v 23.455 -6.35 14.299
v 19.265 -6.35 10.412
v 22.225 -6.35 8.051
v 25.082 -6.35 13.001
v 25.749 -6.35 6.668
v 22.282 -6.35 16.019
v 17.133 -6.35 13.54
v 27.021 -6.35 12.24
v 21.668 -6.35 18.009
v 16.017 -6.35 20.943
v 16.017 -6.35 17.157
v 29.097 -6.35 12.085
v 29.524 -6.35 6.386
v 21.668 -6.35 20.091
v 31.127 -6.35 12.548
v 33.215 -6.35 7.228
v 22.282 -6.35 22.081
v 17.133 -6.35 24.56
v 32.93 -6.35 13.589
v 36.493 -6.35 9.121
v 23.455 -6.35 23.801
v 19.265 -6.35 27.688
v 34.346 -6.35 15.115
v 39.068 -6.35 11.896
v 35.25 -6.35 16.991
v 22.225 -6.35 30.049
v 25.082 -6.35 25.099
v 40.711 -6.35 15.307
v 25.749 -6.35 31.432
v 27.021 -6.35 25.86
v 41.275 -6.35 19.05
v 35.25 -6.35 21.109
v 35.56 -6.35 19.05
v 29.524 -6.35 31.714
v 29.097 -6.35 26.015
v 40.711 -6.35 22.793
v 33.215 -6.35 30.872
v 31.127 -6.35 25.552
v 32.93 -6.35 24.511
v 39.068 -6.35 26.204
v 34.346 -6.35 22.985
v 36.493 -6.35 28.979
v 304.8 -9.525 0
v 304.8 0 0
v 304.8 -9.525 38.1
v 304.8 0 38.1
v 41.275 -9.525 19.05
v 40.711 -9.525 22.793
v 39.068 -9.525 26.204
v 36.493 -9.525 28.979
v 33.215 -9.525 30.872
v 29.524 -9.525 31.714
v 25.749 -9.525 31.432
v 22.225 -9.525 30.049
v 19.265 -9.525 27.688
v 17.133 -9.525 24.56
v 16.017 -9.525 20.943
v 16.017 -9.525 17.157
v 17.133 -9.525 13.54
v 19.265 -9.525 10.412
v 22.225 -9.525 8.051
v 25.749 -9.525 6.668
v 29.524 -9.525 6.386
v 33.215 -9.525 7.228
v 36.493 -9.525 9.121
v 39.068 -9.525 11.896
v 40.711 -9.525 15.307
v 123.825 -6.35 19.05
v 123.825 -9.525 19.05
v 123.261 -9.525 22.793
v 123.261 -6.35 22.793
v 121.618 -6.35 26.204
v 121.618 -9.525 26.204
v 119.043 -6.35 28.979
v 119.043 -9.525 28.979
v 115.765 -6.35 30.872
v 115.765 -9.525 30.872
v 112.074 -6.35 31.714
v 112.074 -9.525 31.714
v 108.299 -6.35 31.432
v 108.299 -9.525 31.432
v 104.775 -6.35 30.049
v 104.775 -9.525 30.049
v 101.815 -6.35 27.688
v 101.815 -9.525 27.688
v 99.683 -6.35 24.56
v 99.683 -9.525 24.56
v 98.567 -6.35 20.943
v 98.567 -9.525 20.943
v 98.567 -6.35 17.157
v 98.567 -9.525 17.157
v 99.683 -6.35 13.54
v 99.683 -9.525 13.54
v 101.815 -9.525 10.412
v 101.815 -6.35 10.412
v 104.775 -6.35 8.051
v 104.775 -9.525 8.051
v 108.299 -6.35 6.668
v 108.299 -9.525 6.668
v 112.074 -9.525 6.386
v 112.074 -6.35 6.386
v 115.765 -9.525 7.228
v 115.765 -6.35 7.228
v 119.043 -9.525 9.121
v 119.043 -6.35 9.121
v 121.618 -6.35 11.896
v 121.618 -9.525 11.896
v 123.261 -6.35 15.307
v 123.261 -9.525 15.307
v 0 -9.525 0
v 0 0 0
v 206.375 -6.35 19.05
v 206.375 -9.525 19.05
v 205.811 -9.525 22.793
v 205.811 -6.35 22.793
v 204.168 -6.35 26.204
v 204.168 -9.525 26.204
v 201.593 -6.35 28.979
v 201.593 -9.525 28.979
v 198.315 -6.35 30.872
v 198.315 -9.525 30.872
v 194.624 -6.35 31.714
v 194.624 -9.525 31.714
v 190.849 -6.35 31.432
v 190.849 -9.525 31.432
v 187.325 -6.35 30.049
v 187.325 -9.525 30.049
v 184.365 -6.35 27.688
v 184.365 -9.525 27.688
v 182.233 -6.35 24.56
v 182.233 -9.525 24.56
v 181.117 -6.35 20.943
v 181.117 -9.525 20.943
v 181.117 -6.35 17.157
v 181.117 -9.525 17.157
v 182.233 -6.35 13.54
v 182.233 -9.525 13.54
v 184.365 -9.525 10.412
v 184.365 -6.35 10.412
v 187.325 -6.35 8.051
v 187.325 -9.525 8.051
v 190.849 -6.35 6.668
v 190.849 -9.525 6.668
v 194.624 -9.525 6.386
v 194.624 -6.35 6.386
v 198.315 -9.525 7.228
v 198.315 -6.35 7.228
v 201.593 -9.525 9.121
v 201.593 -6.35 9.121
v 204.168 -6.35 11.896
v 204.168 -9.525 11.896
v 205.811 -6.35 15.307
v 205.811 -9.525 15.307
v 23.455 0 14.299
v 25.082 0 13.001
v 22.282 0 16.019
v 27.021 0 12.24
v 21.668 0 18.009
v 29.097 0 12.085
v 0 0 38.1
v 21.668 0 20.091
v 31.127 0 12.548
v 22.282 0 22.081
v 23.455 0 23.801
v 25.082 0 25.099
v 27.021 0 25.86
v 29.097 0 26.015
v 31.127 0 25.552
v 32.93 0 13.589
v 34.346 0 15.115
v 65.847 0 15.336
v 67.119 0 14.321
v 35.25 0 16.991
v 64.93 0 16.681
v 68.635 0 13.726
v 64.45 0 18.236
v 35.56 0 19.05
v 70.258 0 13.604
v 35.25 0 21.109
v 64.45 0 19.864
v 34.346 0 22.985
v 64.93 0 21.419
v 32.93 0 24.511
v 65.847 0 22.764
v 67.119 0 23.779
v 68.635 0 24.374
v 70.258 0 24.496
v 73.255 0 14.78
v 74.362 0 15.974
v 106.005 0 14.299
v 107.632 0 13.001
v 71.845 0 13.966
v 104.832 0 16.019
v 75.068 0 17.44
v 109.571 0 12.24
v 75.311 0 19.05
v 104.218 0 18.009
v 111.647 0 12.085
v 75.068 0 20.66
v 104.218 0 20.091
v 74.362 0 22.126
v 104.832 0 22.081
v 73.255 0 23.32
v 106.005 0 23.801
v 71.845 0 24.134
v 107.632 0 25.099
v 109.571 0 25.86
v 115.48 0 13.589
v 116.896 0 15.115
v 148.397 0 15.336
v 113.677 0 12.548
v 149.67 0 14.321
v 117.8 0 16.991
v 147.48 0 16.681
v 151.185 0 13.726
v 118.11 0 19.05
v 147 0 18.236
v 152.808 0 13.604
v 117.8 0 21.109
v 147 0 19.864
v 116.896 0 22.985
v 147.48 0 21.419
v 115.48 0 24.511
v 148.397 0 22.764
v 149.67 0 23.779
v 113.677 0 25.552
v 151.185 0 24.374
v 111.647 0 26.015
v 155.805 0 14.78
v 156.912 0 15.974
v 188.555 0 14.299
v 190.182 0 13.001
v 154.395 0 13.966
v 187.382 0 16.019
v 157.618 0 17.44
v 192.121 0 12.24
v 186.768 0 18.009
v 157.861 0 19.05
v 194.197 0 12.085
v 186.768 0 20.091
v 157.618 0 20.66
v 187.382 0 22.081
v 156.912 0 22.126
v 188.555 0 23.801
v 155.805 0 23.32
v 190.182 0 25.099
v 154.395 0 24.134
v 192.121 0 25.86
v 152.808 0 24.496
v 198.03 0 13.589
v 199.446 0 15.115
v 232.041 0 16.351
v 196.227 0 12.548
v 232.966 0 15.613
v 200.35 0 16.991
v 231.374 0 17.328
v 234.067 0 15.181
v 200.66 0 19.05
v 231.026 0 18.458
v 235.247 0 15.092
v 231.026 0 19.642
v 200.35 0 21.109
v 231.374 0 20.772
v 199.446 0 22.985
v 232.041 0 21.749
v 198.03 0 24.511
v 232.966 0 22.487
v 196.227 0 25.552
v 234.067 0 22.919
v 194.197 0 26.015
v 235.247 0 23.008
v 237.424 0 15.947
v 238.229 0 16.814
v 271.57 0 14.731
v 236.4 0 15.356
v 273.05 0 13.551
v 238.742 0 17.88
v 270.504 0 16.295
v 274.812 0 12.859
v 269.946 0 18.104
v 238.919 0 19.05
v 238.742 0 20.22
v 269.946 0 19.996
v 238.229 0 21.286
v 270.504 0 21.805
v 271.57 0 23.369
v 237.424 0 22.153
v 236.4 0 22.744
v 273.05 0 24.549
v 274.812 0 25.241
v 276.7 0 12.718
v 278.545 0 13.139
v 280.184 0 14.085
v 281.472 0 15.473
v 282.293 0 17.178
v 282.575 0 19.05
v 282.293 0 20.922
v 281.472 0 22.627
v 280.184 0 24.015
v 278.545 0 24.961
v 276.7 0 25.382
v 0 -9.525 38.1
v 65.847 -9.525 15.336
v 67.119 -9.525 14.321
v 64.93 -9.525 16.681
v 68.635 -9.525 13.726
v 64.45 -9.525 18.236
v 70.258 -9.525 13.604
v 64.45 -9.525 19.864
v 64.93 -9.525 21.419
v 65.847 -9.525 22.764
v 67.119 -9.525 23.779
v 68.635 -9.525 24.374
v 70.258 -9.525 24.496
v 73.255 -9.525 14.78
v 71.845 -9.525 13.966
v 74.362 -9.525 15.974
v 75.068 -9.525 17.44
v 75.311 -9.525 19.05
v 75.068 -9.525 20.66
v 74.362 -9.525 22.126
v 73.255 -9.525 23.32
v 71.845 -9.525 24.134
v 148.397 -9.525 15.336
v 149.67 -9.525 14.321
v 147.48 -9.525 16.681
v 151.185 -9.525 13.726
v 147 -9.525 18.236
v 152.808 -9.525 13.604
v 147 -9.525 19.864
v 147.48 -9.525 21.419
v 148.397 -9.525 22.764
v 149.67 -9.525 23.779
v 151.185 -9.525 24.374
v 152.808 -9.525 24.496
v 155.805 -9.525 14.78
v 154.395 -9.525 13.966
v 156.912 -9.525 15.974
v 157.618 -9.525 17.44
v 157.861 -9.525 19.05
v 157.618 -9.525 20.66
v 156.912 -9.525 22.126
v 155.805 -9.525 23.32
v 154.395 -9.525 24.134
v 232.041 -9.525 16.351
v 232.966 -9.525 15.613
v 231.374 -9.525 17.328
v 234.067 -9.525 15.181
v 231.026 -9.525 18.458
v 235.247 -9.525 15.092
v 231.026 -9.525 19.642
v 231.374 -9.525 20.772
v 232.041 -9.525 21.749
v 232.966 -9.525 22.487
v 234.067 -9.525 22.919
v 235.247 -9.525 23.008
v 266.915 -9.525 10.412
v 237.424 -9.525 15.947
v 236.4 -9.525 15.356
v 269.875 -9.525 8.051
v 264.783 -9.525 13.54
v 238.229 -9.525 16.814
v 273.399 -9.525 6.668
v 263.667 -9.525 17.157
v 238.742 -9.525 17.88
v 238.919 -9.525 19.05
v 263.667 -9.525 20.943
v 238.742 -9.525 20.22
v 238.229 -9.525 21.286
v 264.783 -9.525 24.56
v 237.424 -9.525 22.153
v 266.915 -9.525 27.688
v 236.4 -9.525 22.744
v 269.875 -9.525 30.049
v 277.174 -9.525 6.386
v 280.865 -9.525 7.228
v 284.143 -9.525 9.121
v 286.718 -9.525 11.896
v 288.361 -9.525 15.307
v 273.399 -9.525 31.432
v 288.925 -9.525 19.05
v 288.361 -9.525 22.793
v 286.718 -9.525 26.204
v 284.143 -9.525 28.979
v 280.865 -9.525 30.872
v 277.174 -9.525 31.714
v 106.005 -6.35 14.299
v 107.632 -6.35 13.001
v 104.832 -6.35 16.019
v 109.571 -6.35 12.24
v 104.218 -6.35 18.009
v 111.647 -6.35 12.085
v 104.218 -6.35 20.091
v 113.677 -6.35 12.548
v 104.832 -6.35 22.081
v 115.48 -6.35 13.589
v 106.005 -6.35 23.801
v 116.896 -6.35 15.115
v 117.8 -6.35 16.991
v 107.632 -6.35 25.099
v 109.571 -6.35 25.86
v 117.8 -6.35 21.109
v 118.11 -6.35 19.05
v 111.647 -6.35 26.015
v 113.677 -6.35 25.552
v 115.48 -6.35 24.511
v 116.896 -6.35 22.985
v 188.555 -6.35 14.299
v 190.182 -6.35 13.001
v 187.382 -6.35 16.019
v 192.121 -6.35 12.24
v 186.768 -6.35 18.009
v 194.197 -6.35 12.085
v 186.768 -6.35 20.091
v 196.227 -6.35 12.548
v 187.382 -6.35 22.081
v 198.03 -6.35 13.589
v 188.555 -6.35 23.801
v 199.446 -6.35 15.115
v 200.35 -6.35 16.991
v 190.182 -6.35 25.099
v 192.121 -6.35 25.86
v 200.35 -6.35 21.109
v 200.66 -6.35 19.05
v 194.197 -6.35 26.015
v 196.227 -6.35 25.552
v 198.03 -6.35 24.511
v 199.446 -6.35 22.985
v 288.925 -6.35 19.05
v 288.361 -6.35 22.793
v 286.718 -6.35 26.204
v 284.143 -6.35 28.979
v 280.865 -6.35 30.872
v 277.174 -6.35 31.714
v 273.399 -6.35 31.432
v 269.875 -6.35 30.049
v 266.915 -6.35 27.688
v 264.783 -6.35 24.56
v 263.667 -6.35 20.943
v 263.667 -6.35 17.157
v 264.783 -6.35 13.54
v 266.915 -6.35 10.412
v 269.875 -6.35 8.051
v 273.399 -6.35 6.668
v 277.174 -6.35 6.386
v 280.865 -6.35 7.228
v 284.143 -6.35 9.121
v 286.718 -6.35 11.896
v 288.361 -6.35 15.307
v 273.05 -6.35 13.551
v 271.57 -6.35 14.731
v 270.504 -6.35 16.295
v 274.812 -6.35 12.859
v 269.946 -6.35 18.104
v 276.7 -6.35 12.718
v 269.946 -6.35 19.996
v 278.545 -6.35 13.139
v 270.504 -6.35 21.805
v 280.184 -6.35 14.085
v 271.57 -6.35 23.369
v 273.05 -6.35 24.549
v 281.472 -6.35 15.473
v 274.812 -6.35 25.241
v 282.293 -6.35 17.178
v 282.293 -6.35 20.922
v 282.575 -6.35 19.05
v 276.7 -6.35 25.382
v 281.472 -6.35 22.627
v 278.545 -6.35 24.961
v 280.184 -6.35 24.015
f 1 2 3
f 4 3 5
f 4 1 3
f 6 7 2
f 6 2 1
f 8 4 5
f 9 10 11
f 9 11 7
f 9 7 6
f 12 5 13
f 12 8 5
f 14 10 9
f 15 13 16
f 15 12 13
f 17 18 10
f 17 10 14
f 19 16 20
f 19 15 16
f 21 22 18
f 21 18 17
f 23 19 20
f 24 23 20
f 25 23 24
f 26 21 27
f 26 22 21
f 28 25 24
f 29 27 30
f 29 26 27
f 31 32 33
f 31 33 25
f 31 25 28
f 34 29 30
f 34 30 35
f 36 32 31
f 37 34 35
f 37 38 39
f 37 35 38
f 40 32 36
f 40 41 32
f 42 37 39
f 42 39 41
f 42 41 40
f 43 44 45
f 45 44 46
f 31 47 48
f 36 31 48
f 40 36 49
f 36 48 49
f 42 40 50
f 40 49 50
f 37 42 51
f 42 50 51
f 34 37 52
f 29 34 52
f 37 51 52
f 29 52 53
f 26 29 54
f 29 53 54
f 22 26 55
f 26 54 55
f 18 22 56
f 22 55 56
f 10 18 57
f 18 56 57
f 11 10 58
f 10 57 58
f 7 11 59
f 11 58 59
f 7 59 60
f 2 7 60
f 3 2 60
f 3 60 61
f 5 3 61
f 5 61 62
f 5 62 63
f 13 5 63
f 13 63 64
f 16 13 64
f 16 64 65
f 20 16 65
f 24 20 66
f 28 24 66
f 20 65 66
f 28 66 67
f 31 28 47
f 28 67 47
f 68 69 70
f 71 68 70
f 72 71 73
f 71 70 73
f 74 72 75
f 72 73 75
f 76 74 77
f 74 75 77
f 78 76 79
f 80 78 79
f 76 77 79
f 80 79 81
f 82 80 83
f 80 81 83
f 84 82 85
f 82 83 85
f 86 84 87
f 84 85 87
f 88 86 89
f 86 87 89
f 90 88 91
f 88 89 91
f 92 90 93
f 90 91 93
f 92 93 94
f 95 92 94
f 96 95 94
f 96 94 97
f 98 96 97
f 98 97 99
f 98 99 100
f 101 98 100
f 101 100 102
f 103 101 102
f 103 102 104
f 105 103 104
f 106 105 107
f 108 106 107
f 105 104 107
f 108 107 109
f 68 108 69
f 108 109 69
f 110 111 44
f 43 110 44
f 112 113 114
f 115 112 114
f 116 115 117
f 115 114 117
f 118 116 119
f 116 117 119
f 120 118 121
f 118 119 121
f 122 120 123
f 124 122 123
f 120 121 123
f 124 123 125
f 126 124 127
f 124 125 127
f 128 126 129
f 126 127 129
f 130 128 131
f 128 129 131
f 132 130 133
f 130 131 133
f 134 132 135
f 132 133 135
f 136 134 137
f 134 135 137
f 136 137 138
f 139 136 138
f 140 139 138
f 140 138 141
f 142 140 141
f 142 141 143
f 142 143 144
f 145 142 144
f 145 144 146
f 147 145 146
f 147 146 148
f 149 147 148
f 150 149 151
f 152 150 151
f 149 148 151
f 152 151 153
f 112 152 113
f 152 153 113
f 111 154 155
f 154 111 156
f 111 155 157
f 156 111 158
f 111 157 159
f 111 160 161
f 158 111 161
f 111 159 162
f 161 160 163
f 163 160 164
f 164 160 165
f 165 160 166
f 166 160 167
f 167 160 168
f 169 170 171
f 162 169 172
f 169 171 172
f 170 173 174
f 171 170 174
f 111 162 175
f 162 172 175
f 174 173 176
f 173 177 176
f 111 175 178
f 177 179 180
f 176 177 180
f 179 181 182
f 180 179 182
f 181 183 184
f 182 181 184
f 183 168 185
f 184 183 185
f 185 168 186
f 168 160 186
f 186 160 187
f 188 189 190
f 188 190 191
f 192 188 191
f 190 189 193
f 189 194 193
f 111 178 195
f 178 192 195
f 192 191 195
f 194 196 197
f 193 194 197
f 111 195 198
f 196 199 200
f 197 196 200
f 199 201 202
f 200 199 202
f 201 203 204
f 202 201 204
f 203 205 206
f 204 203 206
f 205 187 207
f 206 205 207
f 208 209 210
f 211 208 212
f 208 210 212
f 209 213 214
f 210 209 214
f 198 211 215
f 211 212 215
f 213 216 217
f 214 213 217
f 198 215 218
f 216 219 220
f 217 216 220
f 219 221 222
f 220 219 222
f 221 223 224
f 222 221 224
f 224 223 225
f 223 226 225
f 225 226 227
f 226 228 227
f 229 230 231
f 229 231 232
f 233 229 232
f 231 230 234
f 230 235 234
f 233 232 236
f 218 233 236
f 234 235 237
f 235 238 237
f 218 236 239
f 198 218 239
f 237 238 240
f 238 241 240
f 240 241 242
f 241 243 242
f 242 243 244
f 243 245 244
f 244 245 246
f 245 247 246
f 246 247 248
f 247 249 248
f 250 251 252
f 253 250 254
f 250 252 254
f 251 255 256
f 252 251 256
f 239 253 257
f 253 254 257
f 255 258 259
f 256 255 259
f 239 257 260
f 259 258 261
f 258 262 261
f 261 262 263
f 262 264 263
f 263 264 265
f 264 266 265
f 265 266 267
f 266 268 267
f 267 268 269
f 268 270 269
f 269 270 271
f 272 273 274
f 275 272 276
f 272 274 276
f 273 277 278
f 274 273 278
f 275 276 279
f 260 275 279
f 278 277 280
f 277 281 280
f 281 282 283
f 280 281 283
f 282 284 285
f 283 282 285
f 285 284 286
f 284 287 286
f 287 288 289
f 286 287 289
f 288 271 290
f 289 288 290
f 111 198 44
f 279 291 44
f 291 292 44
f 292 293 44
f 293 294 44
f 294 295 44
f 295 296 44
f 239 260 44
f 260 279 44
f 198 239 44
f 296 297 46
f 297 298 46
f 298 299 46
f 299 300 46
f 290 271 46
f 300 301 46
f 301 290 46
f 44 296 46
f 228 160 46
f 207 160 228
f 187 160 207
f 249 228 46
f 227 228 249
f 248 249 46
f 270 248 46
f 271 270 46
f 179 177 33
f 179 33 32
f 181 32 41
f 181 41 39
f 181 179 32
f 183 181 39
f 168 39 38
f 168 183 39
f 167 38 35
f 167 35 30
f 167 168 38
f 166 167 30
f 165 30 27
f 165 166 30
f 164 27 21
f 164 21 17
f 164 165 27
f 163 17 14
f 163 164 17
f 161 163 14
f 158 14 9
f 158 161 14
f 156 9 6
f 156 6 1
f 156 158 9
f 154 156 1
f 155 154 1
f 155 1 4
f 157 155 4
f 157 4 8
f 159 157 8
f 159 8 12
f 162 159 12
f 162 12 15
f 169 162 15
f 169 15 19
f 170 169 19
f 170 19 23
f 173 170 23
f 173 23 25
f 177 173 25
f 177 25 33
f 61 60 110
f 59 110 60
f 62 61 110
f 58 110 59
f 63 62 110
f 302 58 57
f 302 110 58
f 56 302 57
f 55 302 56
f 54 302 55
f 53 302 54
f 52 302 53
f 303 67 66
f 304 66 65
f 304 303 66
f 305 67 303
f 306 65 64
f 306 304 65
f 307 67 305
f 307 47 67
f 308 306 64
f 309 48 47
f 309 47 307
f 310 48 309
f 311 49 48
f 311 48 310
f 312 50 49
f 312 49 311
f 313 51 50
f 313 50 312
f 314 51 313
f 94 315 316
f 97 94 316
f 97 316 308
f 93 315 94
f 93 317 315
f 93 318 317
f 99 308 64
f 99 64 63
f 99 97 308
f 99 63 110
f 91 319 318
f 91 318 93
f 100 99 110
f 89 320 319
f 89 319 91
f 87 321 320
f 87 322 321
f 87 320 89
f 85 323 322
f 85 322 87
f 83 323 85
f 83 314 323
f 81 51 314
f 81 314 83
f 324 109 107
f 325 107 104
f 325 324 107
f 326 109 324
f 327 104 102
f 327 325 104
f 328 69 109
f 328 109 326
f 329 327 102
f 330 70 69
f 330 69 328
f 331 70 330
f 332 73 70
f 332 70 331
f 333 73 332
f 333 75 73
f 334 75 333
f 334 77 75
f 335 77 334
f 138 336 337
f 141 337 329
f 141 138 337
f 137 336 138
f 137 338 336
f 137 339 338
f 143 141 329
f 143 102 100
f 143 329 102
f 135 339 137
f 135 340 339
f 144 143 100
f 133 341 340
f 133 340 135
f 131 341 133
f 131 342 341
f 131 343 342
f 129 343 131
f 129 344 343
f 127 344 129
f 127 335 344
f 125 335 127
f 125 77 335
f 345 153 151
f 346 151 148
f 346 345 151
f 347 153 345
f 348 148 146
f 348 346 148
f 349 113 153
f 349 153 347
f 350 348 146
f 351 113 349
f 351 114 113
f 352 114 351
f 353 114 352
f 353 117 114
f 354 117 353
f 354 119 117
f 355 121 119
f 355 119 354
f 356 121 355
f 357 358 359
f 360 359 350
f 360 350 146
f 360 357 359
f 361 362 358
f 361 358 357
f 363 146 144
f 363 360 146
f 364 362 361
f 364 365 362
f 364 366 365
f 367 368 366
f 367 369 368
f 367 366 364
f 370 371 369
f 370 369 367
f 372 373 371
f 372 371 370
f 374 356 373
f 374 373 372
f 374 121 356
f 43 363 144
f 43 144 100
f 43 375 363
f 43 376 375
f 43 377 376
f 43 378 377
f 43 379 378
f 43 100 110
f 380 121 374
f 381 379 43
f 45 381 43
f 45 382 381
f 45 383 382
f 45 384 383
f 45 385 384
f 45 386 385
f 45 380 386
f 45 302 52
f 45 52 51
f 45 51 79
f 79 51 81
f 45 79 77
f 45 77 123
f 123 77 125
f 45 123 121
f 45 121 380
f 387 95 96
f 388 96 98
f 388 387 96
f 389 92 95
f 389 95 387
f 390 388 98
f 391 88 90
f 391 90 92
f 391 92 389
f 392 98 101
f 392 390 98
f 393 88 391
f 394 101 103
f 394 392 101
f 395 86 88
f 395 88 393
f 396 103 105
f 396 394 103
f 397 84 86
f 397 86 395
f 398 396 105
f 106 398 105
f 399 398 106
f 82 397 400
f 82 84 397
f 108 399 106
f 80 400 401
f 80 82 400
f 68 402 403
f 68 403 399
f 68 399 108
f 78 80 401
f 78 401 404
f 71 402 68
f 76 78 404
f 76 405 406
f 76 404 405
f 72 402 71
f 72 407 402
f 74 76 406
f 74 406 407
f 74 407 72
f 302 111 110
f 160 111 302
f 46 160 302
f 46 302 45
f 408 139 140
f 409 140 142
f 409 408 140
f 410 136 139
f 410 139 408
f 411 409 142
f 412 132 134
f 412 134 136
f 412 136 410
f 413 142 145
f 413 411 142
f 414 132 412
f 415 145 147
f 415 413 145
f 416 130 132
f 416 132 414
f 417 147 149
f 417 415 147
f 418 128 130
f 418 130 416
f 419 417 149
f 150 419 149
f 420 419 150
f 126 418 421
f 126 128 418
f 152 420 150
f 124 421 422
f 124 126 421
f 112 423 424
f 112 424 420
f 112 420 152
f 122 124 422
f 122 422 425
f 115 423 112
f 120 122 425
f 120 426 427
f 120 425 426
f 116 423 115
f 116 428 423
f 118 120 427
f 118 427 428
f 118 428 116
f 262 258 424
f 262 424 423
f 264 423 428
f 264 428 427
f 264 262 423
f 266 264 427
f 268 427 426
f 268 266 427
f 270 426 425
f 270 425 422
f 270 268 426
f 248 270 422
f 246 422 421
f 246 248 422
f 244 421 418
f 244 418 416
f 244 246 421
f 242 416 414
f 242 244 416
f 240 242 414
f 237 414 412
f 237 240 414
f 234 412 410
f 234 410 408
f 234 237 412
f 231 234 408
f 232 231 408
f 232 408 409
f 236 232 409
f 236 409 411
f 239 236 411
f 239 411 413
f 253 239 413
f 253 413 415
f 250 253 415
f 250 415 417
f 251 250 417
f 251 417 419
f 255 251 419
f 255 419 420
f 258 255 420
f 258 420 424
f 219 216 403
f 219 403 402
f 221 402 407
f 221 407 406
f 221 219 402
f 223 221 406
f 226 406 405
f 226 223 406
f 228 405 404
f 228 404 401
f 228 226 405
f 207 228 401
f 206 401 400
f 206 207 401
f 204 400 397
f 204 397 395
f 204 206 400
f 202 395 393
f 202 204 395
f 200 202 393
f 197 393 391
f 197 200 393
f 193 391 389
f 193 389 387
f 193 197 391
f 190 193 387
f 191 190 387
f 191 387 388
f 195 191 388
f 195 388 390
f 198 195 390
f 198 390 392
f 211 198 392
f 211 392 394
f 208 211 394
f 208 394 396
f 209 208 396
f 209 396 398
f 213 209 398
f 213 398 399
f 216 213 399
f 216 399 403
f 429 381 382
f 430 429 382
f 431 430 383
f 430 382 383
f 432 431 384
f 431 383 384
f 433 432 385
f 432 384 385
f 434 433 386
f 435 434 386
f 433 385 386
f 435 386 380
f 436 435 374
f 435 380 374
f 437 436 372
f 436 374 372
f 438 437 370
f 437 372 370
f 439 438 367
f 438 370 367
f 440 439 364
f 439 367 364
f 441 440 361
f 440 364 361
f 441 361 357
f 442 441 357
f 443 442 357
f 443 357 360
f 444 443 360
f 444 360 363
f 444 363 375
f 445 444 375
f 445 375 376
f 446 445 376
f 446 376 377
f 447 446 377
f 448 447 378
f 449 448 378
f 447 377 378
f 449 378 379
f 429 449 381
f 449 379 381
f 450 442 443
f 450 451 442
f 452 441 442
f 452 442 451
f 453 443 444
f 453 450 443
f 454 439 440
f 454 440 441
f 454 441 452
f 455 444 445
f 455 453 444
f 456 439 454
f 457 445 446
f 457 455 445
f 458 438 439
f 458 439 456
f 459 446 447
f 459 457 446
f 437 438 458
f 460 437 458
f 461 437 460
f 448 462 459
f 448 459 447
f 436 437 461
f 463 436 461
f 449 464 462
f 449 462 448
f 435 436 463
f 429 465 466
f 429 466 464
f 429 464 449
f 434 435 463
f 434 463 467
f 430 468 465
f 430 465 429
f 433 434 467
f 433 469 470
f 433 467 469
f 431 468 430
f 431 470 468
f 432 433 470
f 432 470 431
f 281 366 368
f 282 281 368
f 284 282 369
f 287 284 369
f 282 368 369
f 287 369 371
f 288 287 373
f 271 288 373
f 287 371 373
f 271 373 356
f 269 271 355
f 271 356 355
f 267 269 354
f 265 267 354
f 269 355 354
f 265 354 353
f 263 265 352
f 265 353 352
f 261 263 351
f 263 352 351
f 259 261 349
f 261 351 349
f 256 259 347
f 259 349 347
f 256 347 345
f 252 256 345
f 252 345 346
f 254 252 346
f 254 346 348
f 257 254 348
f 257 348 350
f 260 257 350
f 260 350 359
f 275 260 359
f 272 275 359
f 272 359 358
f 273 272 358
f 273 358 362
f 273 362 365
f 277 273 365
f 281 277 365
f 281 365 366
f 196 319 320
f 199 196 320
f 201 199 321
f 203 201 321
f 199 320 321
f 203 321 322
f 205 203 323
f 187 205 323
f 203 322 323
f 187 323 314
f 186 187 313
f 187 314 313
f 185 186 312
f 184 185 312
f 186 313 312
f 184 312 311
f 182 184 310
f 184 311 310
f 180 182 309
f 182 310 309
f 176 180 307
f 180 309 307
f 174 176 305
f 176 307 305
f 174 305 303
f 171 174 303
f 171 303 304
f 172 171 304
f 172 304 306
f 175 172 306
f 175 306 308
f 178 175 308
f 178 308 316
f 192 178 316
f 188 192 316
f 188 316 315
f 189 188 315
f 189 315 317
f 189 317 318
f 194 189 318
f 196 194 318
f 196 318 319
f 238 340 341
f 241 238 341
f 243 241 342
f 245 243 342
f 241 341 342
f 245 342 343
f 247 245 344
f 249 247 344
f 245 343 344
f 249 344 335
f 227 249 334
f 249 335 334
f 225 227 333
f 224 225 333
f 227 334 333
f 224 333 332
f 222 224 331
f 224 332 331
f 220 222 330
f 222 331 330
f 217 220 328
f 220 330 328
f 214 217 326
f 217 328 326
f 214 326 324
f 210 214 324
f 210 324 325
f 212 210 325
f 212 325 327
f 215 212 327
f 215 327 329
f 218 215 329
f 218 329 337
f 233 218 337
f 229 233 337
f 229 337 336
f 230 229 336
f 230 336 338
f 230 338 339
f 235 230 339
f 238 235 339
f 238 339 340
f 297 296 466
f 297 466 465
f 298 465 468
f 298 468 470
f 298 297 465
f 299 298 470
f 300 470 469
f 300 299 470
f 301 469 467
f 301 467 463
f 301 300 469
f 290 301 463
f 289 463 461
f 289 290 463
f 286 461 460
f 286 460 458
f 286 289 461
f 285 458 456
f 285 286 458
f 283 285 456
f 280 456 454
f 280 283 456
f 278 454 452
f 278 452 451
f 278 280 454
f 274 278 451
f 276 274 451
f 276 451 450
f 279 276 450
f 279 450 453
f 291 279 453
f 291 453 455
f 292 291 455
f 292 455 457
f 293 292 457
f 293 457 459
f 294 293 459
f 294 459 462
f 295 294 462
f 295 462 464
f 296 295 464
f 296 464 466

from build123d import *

# Parameters (mm, degrees)
F0_W     = 304.8
F0_H     = 38.1
F0_R     = 6.985
F0_R_2   = 6.35
F1_DEPTH = 9.525
F2_R     = 5.461
F2_R_2   = 3.96875
F3_DEPTH = 9.526
F2_R_3   = 12.7
F2_R_4   = 6.985
F2_R_5   = 6.35
F4_DEPTH = 3.175


with BuildPart() as f1:
    # F0 (on Front) → F1 (new body)
    with BuildSketch(Plane.XZ):
        with Locations((152.4, 19.05)):
            Rectangle(F0_W, F0_H)
        with Locations((28.575, 19.05)):
            Circle(F0_R, mode=Mode.SUBTRACT)
        with Locations((111.125, 19.05)):
            Circle(F0_R, mode=Mode.SUBTRACT)
        with Locations((193.675, 19.05)):
            Circle(F0_R, mode=Mode.SUBTRACT)
        with Locations((276.225, 19.05)):
            Circle(F0_R_2, mode=Mode.SUBTRACT)
    extrude(amount=F1_DEPTH)

    # F2 (on face) → F3 (cut, through all)
    with BuildSketch(Plane.XZ.offset(9.525)):
        with Locations((69.85, 19.05)):
            Circle(F2_R)
        with Locations((152.4, 19.05)):
            Circle(F2_R)
        with Locations((234.95, 19.05)):
            Circle(F2_R_2)
    extrude(amount=-F3_DEPTH, mode=Mode.SUBTRACT)

    # F2 (on face) → F4 (cut)
    with BuildSketch(Plane.XZ.offset(9.525)):
        with Locations((28.575, 19.05)):
            Circle(F2_R_3)
        with Locations((28.575, 19.05)):
            Circle(F2_R_4, mode=Mode.SUBTRACT)
        with Locations((111.125, 19.05)):
            Circle(F2_R_3)
        with Locations((111.125, 19.05)):
            Circle(F2_R_4, mode=Mode.SUBTRACT)
        with Locations((193.675, 19.05)):
            Circle(F2_R_3)
        with Locations((193.675, 19.05)):
            Circle(F2_R_4, mode=Mode.SUBTRACT)
        with Locations((276.225, 19.05)):
            Circle(F2_R_3)
        with Locations((276.225, 19.05)):
            Circle(F2_R_5, mode=Mode.SUBTRACT)
    extrude(amount=-F4_DEPTH, mode=Mode.SUBTRACT)


solid = f1.part
